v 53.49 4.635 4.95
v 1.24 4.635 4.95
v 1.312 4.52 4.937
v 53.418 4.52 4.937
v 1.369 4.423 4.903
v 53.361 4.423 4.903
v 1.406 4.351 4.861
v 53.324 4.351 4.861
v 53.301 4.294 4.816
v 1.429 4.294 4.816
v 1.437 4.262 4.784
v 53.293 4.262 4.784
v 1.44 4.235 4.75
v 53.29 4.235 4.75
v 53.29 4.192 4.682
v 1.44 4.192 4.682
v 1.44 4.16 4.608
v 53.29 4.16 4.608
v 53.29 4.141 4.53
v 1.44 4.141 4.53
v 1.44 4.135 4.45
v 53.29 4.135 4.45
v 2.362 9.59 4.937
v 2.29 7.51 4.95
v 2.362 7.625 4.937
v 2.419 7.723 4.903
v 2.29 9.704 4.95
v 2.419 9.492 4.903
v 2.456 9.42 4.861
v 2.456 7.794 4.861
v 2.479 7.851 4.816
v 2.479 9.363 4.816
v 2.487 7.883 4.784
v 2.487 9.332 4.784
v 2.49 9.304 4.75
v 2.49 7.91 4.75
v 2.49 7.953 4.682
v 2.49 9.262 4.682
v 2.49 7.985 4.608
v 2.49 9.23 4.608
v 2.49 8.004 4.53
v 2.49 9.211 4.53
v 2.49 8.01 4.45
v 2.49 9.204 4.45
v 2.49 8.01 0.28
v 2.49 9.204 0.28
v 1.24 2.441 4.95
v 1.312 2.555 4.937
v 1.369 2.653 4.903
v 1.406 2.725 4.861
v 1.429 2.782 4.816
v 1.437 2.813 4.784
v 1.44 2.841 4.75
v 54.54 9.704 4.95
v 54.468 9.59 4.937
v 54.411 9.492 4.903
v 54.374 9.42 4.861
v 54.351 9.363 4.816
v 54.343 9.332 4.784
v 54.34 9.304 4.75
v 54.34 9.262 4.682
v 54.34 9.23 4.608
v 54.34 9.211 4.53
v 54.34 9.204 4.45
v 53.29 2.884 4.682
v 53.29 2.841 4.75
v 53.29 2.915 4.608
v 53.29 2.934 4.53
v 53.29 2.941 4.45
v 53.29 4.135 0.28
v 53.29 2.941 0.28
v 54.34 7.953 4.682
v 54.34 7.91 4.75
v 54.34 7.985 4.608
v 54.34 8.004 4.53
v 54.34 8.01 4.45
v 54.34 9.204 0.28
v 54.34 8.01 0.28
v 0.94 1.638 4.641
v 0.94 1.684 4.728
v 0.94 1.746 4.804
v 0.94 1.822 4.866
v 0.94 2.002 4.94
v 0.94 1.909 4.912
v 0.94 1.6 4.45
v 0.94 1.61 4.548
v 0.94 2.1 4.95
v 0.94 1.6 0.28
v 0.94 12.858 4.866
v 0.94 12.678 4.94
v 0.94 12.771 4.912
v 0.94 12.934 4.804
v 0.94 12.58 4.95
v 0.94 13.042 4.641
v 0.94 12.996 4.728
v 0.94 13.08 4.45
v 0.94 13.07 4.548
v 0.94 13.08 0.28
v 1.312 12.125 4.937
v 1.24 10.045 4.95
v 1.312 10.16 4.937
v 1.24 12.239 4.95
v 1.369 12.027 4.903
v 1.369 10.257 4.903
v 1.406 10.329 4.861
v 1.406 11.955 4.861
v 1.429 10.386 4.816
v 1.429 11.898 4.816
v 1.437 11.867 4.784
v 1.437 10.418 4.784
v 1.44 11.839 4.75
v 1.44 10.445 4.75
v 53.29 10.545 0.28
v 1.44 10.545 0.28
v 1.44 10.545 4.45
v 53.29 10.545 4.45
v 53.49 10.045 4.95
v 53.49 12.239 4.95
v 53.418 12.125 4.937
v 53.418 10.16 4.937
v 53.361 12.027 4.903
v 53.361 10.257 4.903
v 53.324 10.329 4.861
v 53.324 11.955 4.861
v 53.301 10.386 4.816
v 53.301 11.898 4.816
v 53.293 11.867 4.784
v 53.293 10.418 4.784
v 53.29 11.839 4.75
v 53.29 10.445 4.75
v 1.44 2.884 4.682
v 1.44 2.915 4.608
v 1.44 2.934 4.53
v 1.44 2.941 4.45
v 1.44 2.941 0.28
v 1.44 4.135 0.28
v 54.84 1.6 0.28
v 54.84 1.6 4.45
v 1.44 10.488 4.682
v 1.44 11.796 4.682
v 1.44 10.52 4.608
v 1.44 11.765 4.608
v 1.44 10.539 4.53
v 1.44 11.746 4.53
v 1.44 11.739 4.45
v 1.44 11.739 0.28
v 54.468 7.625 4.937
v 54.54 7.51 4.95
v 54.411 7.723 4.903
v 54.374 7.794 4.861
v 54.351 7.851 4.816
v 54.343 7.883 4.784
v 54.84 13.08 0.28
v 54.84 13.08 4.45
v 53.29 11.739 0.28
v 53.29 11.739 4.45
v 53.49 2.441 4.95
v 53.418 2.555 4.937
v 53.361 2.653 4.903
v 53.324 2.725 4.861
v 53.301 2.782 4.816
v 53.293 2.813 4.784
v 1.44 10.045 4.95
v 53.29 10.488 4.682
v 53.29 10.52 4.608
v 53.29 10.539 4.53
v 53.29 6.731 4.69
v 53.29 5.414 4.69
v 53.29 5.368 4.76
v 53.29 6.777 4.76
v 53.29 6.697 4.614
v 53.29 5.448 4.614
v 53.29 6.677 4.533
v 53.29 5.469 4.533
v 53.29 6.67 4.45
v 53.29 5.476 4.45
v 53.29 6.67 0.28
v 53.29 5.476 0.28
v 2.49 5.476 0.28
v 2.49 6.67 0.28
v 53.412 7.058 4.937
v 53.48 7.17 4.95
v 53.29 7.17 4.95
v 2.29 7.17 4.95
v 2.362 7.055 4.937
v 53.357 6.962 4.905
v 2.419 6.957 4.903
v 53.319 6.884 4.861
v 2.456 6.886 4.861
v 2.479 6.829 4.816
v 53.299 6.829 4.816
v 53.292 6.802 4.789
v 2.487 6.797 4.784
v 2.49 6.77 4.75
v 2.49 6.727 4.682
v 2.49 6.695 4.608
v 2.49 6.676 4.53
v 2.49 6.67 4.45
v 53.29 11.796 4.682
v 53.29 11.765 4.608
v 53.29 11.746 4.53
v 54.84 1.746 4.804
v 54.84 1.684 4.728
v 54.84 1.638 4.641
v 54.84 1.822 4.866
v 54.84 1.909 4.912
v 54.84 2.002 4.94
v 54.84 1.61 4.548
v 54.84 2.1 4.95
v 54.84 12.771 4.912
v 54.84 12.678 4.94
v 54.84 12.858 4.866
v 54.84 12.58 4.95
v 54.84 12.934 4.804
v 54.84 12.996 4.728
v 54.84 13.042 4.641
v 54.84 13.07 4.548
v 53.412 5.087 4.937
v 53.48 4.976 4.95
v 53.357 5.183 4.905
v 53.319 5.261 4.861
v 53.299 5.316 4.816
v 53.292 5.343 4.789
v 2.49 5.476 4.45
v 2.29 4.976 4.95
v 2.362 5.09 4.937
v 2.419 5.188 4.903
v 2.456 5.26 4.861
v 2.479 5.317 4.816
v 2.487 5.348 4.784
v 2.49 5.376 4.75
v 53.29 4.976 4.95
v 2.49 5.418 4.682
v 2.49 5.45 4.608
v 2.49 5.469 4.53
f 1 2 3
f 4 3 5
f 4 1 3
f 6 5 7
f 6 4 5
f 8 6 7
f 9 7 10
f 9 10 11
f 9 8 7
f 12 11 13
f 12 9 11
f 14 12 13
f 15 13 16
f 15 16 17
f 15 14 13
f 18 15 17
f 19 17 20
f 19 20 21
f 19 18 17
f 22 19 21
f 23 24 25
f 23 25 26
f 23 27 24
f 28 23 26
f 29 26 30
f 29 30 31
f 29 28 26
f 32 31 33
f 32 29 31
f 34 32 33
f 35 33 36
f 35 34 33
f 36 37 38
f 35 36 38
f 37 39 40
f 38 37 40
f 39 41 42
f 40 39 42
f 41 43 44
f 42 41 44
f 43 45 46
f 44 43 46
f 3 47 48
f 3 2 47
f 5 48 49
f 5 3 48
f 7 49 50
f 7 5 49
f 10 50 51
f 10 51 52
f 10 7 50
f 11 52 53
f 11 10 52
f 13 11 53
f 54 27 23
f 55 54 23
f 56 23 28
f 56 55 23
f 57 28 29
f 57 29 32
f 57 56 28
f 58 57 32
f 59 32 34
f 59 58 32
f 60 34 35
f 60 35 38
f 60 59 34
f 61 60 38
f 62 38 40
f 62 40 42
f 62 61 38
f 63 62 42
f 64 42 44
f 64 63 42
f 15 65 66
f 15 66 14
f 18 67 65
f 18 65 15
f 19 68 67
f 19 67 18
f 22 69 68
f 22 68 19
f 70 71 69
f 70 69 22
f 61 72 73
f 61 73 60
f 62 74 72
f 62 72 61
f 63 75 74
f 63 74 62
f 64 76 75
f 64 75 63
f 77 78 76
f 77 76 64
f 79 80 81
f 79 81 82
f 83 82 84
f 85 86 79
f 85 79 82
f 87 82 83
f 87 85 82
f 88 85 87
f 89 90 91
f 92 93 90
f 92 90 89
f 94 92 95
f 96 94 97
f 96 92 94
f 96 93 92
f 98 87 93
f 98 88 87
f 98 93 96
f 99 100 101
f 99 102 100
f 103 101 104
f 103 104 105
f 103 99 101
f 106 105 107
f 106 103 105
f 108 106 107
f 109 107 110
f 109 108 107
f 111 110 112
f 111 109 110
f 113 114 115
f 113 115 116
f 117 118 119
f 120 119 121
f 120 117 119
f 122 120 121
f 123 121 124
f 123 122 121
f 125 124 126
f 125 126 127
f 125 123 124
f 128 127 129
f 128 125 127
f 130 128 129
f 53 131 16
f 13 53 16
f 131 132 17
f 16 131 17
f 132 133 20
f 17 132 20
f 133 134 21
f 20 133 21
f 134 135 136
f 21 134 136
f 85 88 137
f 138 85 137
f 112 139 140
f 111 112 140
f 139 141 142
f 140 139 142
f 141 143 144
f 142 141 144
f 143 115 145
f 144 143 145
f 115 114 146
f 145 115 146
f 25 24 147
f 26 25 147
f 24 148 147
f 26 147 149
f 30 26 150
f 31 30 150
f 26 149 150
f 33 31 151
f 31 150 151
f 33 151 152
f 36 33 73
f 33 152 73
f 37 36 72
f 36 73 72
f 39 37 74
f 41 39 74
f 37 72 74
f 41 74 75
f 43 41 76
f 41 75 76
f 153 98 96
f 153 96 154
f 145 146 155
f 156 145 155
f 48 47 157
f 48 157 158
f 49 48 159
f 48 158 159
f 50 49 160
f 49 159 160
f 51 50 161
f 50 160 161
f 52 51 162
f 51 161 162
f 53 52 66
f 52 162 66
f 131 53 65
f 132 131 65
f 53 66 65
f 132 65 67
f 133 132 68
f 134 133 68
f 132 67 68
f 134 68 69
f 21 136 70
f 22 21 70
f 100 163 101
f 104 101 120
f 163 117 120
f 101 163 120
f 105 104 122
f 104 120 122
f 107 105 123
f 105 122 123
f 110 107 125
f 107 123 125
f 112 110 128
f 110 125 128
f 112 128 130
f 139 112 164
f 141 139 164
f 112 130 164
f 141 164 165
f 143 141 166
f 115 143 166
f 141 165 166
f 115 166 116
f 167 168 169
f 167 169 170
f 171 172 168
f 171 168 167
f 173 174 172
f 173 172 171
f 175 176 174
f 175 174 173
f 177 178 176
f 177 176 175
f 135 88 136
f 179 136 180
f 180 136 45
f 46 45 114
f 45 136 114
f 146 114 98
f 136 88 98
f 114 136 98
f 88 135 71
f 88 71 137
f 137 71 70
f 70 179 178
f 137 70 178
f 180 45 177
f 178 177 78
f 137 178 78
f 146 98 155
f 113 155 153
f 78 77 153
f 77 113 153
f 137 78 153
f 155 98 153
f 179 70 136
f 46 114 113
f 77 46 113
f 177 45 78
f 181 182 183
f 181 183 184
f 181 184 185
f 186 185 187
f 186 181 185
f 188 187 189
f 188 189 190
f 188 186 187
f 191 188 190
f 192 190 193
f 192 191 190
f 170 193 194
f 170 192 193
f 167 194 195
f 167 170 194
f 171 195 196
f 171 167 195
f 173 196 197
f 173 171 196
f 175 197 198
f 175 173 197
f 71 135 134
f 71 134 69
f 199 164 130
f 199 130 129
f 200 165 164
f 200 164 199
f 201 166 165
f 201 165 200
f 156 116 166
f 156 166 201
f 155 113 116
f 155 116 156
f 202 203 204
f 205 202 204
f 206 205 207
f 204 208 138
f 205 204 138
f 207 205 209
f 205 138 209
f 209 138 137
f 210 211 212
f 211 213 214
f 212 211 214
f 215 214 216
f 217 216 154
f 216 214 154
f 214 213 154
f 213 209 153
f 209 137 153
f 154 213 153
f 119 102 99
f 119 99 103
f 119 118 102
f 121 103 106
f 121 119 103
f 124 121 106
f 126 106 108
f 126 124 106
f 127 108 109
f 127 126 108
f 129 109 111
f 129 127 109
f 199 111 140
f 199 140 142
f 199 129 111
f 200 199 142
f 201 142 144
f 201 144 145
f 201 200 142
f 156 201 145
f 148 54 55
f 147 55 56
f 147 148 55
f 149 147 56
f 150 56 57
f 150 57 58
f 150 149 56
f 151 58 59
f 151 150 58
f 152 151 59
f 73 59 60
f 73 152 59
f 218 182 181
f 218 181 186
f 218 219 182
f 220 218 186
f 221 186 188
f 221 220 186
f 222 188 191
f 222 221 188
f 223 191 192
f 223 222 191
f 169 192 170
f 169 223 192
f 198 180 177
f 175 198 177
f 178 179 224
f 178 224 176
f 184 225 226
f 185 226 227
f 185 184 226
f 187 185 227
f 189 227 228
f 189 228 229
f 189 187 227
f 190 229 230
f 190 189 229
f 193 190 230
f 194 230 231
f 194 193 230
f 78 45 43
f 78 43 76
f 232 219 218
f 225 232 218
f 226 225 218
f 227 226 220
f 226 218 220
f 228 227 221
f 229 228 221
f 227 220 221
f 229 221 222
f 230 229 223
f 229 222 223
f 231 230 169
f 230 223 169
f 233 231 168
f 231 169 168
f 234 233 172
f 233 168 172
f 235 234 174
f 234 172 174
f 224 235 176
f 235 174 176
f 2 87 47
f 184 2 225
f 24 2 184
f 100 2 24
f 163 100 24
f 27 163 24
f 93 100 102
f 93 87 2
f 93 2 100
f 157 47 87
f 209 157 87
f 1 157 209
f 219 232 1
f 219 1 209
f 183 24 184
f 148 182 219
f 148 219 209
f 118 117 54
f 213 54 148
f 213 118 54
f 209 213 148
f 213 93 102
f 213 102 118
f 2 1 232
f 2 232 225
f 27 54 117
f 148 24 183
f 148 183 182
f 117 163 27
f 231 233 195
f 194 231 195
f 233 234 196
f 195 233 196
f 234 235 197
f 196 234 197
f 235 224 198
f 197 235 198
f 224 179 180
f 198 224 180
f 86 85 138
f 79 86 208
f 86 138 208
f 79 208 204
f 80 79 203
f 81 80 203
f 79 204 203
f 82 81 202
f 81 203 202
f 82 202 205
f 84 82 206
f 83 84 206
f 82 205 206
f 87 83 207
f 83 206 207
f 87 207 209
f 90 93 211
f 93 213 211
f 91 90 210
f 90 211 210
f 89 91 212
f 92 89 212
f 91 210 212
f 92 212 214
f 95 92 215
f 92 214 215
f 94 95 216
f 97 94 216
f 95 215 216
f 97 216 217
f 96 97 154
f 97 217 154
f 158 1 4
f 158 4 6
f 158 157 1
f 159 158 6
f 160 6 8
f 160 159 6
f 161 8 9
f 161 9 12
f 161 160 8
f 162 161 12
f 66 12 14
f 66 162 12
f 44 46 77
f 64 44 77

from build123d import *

# Parameters (mm, degrees)
SKETCH003_W   = 53.9
SKETCH003_H   = 11.48
SKETCH003_W_2 = 51.85
SKETCH003_H_2 = 1.194
SKETCH003_W_3 = 50.8
PAD001_DEPTH  = 4.67
FILLET_R      = 0.5
FILLET001_R   = 0.5
FILLET002_R   = 0.5
FILLET003_R   = 0.5
FILLET004_R   = 0.5
FILLET005_R   = 0.5
FILLET006_R   = 0.5
FILLET007_R   = 0.5
FILLET008_R   = 0.5
FILLET009_R   = 0.5
FILLET010_R   = 0.2
FILLET011_R   = 0.2
FILLET012_R   = 0.2
FILLET013_R   = 0.2
FILLET014_R   = 0.2
FILLET015_R   = 0.2
FILLET016_R   = 0.2
FILLET017_R   = 0.19


with BuildPart() as part:
    # Sketch003 → Pad001 (new body)
    with BuildSketch(Plane.XY.offset(0.28)):
        with Locations((27.89, 7.34)):
            Rectangle(SKETCH003_W, SKETCH003_H)
        with Locations((27.365, 11.1422)):
            Rectangle(SKETCH003_W_2, SKETCH003_H_2, mode=Mode.SUBTRACT)
        with Locations((28.415, 8.6074)):
            Rectangle(SKETCH003_W_2, SKETCH003_H_2, mode=Mode.SUBTRACT)
        with Locations((27.89, 6.0726)):
            Rectangle(SKETCH003_W_3, SKETCH003_H_2, mode=Mode.SUBTRACT)
        with Locations((27.365, 3.5378)):
            Rectangle(SKETCH003_W_2, SKETCH003_H_2, mode=Mode.SUBTRACT)
    extrude(amount=PAD001_DEPTH)

    # Fillet
    fillet_edges = [part.edges().sort_by_distance(p)[0] for p in [
        (27.89, 1.6, 4.95),
    ]]
    fillet(fillet_edges, radius=FILLET_R)

    # Fillet001
    fillet001_edges = [part.edges().sort_by_distance(p)[0] for p in [
        (27.365, 2.9408, 4.95),
    ]]
    fillet(fillet001_edges, radius=FILLET001_R)

    # Fillet002
    fillet002_edges = [part.edges().sort_by_distance(p)[0] for p in [
        (27.365, 4.1348, 4.95),
    ]]
    fillet(fillet002_edges, radius=FILLET002_R)

    # Fillet003
    fillet003_edges = [part.edges().sort_by_distance(p)[0] for p in [
        (27.89, 5.4756, 4.95),
    ]]
    fillet(fillet003_edges, radius=FILLET003_R)

    # Fillet004
    fillet004_edges = [part.edges().sort_by_distance(p)[0] for p in [
        (27.89, 6.6696, 4.95),
    ]]
    fillet(fillet004_edges, radius=FILLET004_R)

    # Fillet005
    fillet005_edges = [part.edges().sort_by_distance(p)[0] for p in [
        (28.415, 8.0104, 4.95),
    ]]
    fillet(fillet005_edges, radius=FILLET005_R)

    # Fillet006
    fillet006_edges = [part.edges().sort_by_distance(p)[0] for p in [
        (28.415, 9.2044, 4.95),
    ]]
    fillet(fillet006_edges, radius=FILLET006_R)

    # Fillet007
    fillet007_edges = [part.edges().sort_by_distance(p)[0] for p in [
        (27.365, 10.5452, 4.95),
    ]]
    fillet(fillet007_edges, radius=FILLET007_R)

    # Fillet008
    fillet008_edges = [part.edges().sort_by_distance(p)[0] for p in [
        (27.365, 11.7392, 4.95),
    ]]
    fillet(fillet008_edges, radius=FILLET008_R)

    # Fillet009
    fillet009_edges = [part.edges().sort_by_distance(p)[0] for p in [
        (27.89, 13.08, 4.95),
    ]]
    fillet(fillet009_edges, radius=FILLET009_R)

    # Fillet010
    fillet010_edges = [part.edges().sort_by_distance(p)[0] for p in [
        (53.29, 11.1422, 4.95),
    ]]
    fillet(fillet010_edges, radius=FILLET010_R)

    # Fillet011
    fillet011_edges = [part.edges().sort_by_distance(p)[0] for p in [
        (1.44, 11.1422, 4.95),
    ]]
    fillet(fillet011_edges, radius=FILLET011_R)

    # Fillet012
    fillet012_edges = [part.edges().sort_by_distance(p)[0] for p in [
        (2.49, 8.6074, 4.95),
    ]]
    fillet(fillet012_edges, radius=FILLET012_R)

    # Fillet013
    fillet013_edges = [part.edges().sort_by_distance(p)[0] for p in [
        (54.34, 8.6074, 4.95),
    ]]
    fillet(fillet013_edges, radius=FILLET013_R)

    # Fillet014
    fillet014_edges = [part.edges().sort_by_distance(p)[0] for p in [
        (2.49, 6.0726, 4.95),
    ]]
    fillet(fillet014_edges, radius=FILLET014_R)

    # Fillet015
    fillet015_edges = [part.edges().sort_by_distance(p)[0] for p in [
        (1.44, 3.5378, 4.95),
    ]]
    fillet(fillet015_edges, radius=FILLET015_R)

    # Fillet016
    fillet016_edges = [part.edges().sort_by_distance(p)[0] for p in [
        (53.29, 3.5378, 4.95),
    ]]
    fillet(fillet016_edges, radius=FILLET016_R)

    # Fillet017
    fillet017_edges = [part.edges().sort_by_distance(p)[0] for p in [
        (53.29, 6.0726, 4.95),
    ]]
    fillet(fillet017_edges, radius=FILLET017_R)


solid = part.part
